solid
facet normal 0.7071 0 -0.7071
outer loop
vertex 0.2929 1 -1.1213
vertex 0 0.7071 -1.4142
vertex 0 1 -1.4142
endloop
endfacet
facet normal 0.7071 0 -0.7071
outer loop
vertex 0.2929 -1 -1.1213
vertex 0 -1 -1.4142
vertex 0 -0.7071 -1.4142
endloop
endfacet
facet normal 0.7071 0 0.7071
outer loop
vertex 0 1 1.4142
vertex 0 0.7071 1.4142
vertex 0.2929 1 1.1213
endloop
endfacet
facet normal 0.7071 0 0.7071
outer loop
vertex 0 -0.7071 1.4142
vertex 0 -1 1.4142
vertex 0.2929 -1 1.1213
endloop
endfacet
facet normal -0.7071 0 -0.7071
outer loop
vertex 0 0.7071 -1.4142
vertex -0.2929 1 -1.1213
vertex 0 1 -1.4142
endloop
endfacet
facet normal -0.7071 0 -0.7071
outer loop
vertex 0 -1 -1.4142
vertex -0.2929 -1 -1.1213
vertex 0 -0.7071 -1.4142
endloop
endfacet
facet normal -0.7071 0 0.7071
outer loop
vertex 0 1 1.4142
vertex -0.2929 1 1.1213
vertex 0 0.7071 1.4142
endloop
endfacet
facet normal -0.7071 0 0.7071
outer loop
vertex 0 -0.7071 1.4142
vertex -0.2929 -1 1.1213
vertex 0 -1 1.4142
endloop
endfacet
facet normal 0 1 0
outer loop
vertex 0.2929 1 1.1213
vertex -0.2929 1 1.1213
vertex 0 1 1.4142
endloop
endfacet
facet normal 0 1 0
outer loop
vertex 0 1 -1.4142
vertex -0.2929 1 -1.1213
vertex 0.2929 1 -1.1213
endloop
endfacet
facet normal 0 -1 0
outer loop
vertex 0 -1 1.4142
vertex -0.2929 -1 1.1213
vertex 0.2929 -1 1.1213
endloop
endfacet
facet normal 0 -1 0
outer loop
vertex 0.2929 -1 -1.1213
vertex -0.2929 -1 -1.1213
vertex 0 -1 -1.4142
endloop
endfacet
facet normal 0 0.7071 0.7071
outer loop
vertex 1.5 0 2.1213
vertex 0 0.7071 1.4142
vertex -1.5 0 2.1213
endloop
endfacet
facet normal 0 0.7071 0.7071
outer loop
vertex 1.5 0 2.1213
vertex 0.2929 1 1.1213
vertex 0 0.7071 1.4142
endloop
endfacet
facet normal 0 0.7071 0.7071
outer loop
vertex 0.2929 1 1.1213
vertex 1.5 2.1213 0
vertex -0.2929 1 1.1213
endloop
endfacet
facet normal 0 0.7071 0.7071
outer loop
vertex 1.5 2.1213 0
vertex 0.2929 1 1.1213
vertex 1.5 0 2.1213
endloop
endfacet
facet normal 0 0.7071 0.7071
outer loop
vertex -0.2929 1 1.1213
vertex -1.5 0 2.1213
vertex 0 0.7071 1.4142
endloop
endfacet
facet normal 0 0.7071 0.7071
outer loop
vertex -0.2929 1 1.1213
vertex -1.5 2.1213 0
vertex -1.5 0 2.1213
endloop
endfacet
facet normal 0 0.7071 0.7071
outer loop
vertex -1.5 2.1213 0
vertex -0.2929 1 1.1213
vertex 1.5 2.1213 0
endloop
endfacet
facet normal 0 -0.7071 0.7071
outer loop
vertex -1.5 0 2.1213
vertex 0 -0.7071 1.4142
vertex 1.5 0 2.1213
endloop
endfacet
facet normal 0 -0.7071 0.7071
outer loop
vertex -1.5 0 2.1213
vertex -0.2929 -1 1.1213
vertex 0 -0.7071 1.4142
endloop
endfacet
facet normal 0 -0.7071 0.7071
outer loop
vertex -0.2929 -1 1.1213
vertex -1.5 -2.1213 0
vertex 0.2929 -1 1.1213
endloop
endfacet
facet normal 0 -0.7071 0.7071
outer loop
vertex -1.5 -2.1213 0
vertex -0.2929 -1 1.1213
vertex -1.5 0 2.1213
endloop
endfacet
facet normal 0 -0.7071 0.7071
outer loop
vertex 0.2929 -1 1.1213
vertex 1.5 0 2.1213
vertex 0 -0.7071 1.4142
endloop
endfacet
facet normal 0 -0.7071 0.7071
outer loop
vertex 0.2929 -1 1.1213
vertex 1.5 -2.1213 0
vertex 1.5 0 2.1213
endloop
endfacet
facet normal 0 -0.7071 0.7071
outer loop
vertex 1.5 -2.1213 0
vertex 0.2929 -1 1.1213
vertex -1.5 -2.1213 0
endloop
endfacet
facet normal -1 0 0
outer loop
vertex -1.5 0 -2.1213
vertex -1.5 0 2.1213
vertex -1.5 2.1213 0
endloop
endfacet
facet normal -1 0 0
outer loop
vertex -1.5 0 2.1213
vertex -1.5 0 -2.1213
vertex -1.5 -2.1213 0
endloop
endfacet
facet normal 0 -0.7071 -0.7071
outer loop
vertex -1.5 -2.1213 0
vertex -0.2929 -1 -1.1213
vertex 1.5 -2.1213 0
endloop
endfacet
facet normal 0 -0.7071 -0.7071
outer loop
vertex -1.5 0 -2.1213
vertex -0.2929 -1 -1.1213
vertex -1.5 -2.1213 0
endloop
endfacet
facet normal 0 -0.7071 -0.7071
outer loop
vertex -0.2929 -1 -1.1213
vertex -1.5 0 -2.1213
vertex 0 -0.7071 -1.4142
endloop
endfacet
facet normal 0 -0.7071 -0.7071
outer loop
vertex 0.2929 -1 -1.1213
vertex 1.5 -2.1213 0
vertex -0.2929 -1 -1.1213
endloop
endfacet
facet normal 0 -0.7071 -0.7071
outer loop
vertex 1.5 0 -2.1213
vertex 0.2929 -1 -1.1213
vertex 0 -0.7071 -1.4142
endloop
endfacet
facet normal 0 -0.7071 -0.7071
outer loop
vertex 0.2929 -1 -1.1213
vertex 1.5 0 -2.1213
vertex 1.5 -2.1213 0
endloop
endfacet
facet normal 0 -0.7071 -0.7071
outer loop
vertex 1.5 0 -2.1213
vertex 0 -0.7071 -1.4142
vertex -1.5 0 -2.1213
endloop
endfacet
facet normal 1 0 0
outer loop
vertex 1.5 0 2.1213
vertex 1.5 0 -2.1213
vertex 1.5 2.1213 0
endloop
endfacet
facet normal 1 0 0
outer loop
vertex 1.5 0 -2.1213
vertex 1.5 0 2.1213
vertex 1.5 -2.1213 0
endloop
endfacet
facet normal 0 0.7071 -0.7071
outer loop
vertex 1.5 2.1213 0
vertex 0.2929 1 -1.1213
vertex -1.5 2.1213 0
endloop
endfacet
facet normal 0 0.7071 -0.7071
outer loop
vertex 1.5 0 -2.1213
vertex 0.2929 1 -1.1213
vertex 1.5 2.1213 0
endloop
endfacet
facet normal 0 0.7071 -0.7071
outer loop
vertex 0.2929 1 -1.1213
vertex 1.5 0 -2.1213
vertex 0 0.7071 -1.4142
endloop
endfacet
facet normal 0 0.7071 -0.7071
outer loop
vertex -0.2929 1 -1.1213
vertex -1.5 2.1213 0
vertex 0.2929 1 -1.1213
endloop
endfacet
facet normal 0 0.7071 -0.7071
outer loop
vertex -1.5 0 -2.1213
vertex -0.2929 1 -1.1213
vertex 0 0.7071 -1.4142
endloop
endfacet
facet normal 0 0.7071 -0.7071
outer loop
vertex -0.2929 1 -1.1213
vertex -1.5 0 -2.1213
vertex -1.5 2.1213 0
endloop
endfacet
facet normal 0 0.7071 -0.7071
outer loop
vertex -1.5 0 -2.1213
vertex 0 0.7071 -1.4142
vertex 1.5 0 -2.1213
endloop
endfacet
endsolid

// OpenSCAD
translate([0.0,0,0.0]){
	rotate([0,45.0,0]){
		cube([2.0,2.0,2.0], center = true);
	}
}
translate([0,0.0,0.0]){
	rotate([0,45.0,90]){
		cube([3.0,3.0,3.0], center = true);
	}
}
